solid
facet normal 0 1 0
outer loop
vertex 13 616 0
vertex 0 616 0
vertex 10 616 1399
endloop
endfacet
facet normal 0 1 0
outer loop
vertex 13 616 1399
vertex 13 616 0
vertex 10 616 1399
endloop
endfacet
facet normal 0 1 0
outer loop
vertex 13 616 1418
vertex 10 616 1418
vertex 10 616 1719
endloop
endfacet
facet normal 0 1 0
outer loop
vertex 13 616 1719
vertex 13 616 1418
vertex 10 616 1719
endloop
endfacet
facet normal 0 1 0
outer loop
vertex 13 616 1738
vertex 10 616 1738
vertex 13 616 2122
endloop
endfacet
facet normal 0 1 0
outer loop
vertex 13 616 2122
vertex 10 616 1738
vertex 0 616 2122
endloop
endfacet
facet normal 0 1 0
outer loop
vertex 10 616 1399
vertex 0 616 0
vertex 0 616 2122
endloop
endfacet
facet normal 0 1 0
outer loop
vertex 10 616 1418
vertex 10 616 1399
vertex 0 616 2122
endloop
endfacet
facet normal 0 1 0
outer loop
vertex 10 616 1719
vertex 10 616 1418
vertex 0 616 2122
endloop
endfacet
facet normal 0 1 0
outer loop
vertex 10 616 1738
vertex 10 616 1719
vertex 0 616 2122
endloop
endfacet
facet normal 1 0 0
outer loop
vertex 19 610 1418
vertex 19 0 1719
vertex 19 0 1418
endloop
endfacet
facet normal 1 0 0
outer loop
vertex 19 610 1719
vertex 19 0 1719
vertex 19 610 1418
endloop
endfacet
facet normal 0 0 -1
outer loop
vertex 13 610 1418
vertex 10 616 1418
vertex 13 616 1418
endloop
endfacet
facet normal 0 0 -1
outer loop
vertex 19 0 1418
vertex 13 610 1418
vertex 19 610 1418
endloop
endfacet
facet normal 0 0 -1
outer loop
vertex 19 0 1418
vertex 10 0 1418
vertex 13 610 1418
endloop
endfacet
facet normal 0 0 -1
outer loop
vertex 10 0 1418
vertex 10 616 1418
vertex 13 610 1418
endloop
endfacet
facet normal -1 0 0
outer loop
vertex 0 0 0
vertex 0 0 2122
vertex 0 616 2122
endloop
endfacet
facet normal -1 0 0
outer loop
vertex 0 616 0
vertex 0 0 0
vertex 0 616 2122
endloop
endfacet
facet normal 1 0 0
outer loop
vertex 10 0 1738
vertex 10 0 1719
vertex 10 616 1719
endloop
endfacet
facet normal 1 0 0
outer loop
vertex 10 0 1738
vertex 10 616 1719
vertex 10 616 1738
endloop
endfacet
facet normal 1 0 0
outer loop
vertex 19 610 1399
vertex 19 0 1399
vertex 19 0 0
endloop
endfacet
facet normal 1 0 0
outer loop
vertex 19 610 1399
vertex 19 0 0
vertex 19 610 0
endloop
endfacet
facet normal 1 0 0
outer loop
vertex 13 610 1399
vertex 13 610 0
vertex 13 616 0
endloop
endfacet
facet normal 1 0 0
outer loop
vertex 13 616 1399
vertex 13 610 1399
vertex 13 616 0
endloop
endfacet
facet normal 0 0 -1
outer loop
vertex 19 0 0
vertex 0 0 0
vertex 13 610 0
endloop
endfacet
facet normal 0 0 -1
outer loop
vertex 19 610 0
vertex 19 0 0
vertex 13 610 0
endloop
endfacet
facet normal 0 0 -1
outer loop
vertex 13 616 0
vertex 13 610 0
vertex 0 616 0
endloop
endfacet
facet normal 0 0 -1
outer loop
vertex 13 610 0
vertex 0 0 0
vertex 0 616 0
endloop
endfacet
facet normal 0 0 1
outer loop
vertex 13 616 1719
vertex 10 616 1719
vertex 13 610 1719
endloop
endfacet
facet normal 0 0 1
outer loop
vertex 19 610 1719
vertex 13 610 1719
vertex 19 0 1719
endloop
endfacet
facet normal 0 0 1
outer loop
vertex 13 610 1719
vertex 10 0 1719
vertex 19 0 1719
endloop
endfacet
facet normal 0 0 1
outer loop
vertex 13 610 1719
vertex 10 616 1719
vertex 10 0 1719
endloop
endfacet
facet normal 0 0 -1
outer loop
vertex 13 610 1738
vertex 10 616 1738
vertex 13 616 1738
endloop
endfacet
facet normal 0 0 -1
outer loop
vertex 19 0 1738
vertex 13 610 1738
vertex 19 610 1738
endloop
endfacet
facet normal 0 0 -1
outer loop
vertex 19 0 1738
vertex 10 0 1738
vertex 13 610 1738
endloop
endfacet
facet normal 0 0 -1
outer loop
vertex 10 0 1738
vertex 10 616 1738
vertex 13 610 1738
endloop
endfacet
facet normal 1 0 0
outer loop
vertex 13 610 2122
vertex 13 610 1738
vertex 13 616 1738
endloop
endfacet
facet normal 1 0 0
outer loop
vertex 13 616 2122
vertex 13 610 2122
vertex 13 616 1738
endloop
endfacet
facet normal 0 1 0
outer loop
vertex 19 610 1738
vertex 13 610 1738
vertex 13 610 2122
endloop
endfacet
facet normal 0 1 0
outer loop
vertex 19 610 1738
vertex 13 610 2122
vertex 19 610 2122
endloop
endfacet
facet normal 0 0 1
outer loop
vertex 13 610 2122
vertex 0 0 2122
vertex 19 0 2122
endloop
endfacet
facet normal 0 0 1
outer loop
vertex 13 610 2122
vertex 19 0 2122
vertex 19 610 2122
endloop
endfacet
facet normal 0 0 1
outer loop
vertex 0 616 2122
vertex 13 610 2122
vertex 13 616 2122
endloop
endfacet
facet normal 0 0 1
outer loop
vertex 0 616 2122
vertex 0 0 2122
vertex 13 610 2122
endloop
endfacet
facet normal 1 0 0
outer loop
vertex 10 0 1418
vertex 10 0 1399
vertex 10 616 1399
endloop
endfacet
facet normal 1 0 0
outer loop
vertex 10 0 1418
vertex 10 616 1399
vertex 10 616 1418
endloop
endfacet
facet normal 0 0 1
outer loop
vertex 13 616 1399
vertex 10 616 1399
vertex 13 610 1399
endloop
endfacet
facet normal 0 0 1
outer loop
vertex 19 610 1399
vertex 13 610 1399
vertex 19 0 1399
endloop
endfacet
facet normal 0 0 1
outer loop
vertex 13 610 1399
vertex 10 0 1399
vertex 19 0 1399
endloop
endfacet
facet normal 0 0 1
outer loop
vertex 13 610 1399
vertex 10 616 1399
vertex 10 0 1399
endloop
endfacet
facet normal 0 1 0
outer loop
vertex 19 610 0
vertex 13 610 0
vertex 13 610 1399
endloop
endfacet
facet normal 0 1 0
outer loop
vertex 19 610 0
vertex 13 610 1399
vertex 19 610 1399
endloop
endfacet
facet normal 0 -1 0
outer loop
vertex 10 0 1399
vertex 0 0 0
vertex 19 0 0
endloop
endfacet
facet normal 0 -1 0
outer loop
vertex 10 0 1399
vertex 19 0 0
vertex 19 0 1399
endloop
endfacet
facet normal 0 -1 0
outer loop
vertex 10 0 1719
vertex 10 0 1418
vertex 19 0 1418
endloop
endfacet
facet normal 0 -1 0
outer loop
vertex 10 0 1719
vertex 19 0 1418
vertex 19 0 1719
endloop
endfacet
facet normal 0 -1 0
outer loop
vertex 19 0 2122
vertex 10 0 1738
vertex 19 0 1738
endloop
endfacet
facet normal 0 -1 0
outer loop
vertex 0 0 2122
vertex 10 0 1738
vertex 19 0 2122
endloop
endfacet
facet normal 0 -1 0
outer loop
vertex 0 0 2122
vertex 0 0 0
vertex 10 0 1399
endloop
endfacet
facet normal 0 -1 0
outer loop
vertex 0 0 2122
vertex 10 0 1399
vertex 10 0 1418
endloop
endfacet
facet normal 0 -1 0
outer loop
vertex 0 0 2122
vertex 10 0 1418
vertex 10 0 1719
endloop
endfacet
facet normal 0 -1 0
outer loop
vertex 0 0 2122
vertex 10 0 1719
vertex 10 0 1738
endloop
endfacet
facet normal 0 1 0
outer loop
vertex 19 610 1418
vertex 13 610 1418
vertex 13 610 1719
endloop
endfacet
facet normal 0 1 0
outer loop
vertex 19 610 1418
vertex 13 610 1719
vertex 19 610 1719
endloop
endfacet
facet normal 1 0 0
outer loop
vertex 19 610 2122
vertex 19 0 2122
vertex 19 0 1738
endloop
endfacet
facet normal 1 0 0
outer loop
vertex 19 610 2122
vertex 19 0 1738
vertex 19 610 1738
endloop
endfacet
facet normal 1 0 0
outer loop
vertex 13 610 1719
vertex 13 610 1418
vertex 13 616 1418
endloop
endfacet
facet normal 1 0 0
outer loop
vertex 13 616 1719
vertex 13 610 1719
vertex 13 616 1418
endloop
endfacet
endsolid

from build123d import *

# Parameters (mm, degrees)
F0_W     = 616
F0_H     = 2122
F1_DEPTH = 19
F2_W     = 6
F2_H     = 6
F3_DEPTH = 2122.001
F4_W     = 9
F4_H     = 19
F5_DEPTH = 616.001
F6_W     = 9
F6_H     = 19
F7_DEPTH = 616.001


with BuildPart() as f1:
    # F0 (on Right) → F1 (new body)
    with BuildSketch(Plane.YZ):
        with Locations((308, 1061)):
            Rectangle(F0_W, F0_H)
    extrude(amount=F1_DEPTH)

    # F2 (on Top) → F3 (cut, through all)
    with BuildSketch(Plane.XY):
        with Locations((16, 613)):
            Rectangle(F2_W, F2_H)
    extrude(amount=F3_DEPTH, mode=Mode.SUBTRACT)

    # F4 (on Front) → F5 (cut, through all)
    with BuildSketch(Plane.XZ):
        with Locations((14.5, 1408.5)):
            Rectangle(F4_W, F4_H)
    extrude(amount=-F5_DEPTH, mode=Mode.SUBTRACT)

    # F6 (on Front) → F7 (cut, through all)
    with BuildSketch(Plane.XZ):
        with Locations((14.5, 1728.5)):
            Rectangle(F6_W, F6_H)
    extrude(amount=-F7_DEPTH, mode=Mode.SUBTRACT)


solid = f1.part
